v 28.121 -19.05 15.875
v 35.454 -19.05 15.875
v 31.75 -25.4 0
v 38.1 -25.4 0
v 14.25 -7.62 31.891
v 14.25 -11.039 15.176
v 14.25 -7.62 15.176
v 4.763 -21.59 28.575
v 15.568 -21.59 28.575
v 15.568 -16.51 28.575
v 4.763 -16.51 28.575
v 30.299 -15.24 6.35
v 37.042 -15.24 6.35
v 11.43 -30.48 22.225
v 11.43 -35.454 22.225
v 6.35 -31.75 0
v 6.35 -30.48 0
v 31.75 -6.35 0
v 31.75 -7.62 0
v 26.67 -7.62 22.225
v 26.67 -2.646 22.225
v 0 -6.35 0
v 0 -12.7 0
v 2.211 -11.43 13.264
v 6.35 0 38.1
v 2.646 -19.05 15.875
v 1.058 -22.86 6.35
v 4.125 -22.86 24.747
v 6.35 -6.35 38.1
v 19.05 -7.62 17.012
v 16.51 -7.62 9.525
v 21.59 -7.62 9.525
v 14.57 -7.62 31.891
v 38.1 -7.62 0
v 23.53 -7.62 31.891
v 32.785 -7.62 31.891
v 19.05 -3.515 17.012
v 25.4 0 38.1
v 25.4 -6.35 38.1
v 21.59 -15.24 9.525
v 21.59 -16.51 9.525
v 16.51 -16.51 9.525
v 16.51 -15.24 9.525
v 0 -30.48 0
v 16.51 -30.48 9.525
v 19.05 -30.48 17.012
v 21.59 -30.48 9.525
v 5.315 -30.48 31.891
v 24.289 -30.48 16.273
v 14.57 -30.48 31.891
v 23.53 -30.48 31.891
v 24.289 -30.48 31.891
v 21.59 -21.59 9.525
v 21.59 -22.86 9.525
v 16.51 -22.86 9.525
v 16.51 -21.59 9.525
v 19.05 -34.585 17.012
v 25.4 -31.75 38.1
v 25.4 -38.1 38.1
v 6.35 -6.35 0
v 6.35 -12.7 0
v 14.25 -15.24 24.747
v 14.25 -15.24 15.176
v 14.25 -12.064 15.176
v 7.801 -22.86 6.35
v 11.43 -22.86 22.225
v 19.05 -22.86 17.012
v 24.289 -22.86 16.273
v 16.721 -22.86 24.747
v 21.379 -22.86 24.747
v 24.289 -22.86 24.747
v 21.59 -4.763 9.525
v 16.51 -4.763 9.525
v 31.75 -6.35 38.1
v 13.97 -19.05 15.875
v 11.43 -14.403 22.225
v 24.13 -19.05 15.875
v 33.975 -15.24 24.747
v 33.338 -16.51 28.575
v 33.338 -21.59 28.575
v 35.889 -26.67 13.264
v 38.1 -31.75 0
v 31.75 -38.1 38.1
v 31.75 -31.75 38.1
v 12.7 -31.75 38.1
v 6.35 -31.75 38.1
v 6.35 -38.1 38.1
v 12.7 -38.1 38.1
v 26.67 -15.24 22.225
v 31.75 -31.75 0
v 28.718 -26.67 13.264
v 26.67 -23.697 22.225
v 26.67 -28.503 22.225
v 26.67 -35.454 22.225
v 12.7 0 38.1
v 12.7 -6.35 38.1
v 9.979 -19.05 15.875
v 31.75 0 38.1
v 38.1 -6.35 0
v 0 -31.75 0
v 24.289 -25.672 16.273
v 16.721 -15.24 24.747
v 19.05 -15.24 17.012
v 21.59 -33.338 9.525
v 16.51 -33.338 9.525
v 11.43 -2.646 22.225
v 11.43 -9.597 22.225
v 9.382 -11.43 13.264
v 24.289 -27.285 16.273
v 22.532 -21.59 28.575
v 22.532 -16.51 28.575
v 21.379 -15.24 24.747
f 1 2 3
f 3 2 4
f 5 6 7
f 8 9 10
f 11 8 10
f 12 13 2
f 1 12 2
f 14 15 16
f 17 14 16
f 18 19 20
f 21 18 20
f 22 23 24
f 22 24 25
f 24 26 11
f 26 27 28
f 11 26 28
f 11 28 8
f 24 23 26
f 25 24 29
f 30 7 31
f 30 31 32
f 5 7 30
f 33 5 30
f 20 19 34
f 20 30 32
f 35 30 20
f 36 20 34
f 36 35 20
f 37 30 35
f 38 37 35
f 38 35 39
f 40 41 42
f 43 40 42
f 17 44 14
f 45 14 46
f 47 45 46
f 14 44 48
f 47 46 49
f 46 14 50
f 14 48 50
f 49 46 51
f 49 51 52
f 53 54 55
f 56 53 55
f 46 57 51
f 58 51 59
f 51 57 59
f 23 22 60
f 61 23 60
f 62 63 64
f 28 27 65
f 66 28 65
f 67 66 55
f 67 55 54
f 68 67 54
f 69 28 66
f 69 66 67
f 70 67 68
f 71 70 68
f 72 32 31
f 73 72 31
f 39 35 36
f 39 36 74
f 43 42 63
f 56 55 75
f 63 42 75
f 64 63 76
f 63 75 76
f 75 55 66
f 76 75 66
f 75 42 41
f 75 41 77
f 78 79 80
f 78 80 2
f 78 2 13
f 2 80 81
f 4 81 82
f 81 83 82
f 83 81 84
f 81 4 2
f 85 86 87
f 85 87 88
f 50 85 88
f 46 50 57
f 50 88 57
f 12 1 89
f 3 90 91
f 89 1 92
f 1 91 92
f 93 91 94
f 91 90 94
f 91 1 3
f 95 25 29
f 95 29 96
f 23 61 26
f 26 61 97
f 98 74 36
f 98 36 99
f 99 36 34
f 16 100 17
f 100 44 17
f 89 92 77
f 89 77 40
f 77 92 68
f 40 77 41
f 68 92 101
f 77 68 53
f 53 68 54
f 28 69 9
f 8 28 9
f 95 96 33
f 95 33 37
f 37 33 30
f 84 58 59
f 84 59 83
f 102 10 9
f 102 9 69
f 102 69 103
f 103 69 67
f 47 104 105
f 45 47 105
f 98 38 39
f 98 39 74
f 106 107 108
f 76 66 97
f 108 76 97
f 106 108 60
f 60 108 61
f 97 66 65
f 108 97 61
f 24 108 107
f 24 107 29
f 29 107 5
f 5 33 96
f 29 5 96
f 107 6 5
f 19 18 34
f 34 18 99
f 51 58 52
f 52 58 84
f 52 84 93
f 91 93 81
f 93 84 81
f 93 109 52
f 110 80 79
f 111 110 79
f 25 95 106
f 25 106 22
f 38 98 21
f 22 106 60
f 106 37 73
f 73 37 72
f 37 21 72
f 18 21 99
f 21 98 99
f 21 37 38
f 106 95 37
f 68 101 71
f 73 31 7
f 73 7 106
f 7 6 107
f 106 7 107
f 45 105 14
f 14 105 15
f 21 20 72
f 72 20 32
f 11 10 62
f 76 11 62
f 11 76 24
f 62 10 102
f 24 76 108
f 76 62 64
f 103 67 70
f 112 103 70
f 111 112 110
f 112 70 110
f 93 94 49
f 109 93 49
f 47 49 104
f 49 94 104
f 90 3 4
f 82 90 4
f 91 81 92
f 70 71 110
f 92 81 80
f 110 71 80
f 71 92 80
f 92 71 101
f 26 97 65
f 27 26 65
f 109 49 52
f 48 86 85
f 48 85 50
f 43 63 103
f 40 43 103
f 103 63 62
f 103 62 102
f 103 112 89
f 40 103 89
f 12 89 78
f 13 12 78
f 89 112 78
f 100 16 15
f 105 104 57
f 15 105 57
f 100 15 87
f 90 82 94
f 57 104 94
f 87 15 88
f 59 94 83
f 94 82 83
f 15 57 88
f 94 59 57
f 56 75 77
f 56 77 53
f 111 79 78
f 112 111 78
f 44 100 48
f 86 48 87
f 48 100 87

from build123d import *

# Parameters (mm, degrees)
F0_W      = 38.1
F0_H      = 38.1
F1_DEPTH  = 38.1
F6_DEPTH  = 38.1
F8_DEPTH  = 38.1
F9_W      = 23.850204
F9_H      = 7.62
F9_W_2    = 24.289329
F10_DEPTH = 38.1


with BuildPart() as f1:
    # F0 (on Front) → F1 (new body)
    with BuildSketch(Plane.XZ):
        with Locations((19.05, 19.05)):
            Rectangle(F0_W, F0_H)
    extrude(amount=F1_DEPTH)

    # F5 (on offset) → F6 (cut)
    with BuildSketch(Plane.YZ.offset(38.1)):
        Polygon((-11.43, 13.264209), (-6.35, 38.1), (-9.257666, 38.1), (-31.75, 38.1), (-26.67, 13.264209), (-21.59, 28.575), (-16.51, 28.575), align=None)
        Polygon((-38.1, 0), (-31.75, 0), (-38.1, 38.1), align=None)
        Polygon((-25.4, 0), (-12.7, 0), (-19.05, 15.875), align=None)
        Polygon((-6.35, 0), (0, 0), (0, 38.1), align=None)
    extrude(amount=-F6_DEPTH, mode=Mode.SUBTRACT)

    # F7 (on offset) → F8 (cut)
    with BuildSketch(Plane.XZ.offset(38.1)):
        Polygon((0, 38.1), (0, 0), (6.35, 38.1), align=None)
        Polygon((19.05, 17.011538), (25.4, 38.1), (12.7, 38.1), align=None)
        Polygon((6.35, 0), (31.75, 0), (26.67, 22.225), (21.59, 9.525), (16.51, 9.525), (11.43, 22.225), align=None)
        Polygon((38.1, 0), (38.1, 38.1), (31.75, 38.1), align=None)
    extrude(amount=-F8_DEPTH, mode=Mode.SUBTRACT)

    # F9 (on offset) → F10 (cut)
    with BuildSketch(Plane.XY.offset(38.1)):
        with Locations((26.174898, -11.43)):
            Rectangle(F9_W, F9_H)
        with Locations((12.144664, -26.67)):
            Rectangle(F9_W_2, F9_H)
    extrude(amount=-F10_DEPTH, mode=Mode.SUBTRACT)


solid = f1.part
